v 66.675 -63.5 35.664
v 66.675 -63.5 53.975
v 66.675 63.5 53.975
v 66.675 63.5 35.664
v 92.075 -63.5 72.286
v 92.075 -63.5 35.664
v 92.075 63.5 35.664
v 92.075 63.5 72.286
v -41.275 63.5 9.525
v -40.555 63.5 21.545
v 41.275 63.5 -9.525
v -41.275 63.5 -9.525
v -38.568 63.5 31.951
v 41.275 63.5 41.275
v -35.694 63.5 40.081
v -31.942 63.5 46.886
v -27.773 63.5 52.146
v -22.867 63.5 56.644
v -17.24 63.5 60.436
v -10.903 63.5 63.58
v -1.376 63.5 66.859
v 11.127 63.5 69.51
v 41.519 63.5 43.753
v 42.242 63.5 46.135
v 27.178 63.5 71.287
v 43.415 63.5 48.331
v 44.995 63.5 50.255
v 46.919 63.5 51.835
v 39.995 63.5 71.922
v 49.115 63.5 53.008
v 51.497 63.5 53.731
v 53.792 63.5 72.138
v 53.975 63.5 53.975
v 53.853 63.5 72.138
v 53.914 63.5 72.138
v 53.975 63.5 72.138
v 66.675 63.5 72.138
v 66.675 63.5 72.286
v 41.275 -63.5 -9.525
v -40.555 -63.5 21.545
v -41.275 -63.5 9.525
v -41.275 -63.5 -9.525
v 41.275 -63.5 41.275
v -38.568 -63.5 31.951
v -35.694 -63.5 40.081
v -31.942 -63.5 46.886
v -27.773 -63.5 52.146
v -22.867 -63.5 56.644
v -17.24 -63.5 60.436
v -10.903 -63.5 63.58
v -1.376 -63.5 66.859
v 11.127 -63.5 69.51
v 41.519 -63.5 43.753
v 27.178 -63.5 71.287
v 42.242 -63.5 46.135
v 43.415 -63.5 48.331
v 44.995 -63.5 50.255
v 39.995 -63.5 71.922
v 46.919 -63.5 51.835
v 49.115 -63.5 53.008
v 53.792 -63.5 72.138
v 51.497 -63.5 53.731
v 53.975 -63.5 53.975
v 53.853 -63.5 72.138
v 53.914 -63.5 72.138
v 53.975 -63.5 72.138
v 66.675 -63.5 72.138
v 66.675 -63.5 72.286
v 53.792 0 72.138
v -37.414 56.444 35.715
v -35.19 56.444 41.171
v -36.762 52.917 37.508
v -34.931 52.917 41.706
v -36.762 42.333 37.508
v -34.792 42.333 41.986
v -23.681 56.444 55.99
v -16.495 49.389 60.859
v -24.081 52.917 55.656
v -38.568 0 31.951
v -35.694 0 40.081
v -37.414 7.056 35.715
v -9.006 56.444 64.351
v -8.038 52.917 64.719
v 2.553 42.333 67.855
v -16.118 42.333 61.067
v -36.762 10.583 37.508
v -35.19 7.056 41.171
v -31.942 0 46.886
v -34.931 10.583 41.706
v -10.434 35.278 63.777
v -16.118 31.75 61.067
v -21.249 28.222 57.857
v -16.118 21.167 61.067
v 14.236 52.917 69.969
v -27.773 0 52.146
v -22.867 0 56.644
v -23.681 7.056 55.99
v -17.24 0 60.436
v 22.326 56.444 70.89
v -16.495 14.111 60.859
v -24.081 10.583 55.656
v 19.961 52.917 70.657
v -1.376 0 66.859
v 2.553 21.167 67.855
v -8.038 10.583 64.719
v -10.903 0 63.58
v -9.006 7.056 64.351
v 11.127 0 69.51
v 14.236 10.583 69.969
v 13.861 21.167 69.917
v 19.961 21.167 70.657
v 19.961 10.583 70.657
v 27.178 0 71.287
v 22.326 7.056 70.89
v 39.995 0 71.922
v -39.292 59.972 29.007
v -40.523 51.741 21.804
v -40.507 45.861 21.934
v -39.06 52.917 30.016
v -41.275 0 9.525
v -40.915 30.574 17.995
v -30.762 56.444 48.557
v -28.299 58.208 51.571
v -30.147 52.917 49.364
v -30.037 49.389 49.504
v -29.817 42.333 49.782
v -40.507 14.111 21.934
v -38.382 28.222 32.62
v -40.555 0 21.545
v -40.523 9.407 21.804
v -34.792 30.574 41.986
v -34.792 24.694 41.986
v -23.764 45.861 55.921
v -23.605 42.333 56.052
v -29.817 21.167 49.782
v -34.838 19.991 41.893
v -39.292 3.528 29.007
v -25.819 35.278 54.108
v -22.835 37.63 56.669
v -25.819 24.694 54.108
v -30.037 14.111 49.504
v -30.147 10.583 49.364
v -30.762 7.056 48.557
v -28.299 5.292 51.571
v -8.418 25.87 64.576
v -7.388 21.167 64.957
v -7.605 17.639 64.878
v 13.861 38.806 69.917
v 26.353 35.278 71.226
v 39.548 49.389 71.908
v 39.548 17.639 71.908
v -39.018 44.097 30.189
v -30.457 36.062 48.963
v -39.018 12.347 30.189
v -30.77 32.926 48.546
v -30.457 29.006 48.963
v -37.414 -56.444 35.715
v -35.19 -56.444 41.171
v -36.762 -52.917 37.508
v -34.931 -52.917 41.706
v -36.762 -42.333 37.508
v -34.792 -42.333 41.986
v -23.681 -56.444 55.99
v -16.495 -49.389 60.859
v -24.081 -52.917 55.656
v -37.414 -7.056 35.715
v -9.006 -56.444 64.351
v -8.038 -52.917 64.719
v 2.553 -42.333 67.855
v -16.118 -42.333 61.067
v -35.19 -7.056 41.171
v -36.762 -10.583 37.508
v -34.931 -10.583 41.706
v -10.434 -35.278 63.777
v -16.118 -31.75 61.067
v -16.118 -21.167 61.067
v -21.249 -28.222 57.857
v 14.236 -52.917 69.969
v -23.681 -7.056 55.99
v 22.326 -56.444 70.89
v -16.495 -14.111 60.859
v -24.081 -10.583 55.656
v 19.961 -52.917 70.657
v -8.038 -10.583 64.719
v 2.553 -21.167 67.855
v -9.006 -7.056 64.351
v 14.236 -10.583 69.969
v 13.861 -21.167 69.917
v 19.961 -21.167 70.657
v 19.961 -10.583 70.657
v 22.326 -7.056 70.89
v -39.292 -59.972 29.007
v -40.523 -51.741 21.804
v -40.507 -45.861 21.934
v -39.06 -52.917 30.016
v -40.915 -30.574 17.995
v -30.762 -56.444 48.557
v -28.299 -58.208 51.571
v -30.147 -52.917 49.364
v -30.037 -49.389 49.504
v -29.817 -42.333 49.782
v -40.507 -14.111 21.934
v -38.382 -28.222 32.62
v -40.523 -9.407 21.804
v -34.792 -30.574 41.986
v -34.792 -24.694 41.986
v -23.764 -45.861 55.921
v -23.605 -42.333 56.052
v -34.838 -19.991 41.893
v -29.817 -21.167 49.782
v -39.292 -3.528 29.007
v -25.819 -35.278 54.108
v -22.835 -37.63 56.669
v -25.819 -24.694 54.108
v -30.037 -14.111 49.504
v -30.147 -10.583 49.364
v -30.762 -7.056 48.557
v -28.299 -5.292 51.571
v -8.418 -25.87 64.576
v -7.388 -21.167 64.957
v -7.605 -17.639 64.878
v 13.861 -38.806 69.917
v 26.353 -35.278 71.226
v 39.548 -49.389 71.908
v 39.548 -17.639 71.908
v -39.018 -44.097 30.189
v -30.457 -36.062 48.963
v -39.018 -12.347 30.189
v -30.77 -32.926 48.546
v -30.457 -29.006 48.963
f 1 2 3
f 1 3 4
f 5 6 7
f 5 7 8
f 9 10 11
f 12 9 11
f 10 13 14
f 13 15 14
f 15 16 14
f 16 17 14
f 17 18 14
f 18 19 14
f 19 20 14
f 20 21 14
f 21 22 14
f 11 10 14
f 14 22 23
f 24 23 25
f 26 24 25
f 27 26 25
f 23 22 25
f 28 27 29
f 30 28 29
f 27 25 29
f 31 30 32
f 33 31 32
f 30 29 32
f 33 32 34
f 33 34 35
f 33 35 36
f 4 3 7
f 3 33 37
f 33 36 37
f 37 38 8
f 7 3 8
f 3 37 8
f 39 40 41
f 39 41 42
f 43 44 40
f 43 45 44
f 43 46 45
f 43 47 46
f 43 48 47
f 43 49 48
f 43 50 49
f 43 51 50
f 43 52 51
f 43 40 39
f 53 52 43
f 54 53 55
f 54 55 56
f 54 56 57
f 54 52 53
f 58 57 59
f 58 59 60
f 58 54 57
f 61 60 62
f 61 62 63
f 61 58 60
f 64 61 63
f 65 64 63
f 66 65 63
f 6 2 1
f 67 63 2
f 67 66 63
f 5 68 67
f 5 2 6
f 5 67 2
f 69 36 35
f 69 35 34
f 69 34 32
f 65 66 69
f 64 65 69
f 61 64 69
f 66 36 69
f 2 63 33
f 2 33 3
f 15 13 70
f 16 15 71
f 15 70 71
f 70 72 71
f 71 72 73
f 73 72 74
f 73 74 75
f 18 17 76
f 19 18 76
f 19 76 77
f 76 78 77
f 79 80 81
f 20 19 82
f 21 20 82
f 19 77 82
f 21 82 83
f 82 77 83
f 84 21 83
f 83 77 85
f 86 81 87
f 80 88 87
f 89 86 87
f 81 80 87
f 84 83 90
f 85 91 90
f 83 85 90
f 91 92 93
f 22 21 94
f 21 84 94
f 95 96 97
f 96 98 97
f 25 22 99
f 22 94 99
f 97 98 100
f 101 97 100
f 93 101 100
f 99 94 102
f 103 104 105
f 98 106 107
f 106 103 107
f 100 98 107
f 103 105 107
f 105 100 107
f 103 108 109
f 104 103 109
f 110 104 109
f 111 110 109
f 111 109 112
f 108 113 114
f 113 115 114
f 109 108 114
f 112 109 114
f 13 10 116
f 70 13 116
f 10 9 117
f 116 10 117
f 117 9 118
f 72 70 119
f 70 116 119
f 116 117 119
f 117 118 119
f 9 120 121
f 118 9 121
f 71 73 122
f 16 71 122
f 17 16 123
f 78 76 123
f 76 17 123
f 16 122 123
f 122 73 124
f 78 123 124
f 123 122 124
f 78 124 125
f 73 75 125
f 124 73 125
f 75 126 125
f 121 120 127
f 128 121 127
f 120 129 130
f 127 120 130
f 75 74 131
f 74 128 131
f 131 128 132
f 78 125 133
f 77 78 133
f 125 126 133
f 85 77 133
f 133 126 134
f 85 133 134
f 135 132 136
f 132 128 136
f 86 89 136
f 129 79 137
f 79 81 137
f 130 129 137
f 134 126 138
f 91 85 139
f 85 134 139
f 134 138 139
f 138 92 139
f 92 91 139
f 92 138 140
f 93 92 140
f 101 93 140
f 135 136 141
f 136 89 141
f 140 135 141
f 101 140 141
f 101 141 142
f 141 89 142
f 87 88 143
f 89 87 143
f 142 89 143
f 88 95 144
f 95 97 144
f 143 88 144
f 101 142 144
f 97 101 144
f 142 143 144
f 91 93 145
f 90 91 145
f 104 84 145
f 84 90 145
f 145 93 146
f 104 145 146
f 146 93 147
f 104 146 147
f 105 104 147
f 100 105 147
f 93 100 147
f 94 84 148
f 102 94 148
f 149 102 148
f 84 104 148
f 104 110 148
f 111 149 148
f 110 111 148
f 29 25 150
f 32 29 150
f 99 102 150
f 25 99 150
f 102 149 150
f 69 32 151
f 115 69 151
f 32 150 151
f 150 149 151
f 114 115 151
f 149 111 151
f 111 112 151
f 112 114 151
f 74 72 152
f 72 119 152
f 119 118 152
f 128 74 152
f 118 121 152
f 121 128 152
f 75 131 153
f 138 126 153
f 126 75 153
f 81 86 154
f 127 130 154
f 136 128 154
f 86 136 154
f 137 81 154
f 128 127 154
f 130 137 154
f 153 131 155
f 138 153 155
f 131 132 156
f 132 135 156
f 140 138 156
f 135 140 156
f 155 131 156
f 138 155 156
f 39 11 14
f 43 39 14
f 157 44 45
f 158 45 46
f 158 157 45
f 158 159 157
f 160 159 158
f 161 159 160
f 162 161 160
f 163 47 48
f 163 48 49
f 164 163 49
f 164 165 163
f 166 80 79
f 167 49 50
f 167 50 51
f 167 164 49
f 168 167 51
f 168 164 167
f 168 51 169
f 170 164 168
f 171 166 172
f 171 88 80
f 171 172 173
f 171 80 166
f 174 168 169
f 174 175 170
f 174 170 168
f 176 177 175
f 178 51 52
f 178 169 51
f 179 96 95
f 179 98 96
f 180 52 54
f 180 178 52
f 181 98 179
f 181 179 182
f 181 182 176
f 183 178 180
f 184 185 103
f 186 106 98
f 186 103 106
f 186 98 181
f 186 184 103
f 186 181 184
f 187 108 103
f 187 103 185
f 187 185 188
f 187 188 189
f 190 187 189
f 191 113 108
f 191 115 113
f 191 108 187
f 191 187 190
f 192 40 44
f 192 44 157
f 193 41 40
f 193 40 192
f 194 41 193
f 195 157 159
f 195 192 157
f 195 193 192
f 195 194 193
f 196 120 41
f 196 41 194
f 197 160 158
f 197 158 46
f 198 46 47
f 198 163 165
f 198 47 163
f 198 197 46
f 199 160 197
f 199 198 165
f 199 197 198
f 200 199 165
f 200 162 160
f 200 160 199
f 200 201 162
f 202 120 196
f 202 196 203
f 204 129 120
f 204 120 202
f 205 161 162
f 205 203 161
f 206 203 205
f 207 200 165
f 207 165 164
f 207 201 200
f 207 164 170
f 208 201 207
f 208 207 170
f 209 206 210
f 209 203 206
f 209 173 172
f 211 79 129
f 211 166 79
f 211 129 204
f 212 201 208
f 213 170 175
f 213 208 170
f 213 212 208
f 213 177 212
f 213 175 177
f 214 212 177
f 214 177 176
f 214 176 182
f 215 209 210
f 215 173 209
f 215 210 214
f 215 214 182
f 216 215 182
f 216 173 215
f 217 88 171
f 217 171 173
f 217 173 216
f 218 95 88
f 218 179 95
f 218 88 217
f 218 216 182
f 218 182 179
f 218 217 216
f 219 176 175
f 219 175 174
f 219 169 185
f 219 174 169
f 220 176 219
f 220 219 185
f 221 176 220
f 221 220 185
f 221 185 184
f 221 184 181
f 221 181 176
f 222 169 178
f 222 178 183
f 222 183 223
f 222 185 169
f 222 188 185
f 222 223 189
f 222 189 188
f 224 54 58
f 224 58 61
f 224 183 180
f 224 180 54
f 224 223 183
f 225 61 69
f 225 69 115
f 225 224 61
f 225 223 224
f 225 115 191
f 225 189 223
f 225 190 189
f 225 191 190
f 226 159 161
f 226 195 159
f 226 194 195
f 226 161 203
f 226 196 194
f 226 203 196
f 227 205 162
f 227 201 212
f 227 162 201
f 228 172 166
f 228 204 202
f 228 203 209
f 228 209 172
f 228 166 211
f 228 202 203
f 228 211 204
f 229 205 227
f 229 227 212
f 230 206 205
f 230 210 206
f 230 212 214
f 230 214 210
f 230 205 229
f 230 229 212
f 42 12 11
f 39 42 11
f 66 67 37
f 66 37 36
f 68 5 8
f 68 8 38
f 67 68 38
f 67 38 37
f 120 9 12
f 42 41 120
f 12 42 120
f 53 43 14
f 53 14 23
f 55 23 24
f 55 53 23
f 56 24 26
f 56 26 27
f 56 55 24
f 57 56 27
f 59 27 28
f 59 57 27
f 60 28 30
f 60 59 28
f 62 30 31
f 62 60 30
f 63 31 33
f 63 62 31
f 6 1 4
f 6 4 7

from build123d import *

# Parameters (mm, degrees)
F1_DEPTH = 63.5


with BuildPart() as f1:
    # F0 (on Front) → F1 (new body, symmetric)
    with BuildSketch(Plane.XZ):
        Polygon((-41.275, -9.525), (41.275, -9.525), (41.275, 9.525), (23.111848, 9.525), (-41.275, 9.525), align=None)
        with BuildLine():
            Line((23.111848, 9.525), (41.275, 9.525))
            Line((41.275, 9.525), (41.275, 41.275))
            ThreePointArc((41.275, 41.275), (44.994744, 50.255256), (53.975, 53.975))
            Line((53.975, 53.975), (66.675, 53.975))
            Line((66.675, 53.975), (66.675, 72.138152))
            Line((66.675, 72.138152), (53.975, 72.138152))
            ThreePointArc((53.975, 72.138152), (53.883431, 72.138016), (53.791864, 72.137608))
            ThreePointArc((53.791864, 72.137608), (32.086803, 63.033699), (23.111848, 41.275))
            Line((23.111848, 41.275), (23.111848, 9.525))
        make_face()
        with BuildLine():
            add(Edge.make_bspline(
                [(-41.275, 9.525), (-40.953308, 63.672334), (-6.200092, 71.951322), (53.791864, 72.137608)],
                knots=[0, 0, 0, 0, 113.870886, 113.870886, 113.870886, 113.870886], degree=3))
            Line((-41.275, 9.525), (23.111848, 9.525))
            Line((23.111848, 9.525), (23.111848, 41.275))
            ThreePointArc((23.111848, 41.275), (32.086803, 63.033699), (53.791864, 72.137608))
        make_face()
        Polygon((66.675, 72.138152), (66.675, 53.975), (66.675, 35.663907), (92.075, 35.663907), (92.075, 72.286093), (66.675, 72.286093), align=None)
    extrude(amount=F1_DEPTH, both=True)


solid = f1.part
